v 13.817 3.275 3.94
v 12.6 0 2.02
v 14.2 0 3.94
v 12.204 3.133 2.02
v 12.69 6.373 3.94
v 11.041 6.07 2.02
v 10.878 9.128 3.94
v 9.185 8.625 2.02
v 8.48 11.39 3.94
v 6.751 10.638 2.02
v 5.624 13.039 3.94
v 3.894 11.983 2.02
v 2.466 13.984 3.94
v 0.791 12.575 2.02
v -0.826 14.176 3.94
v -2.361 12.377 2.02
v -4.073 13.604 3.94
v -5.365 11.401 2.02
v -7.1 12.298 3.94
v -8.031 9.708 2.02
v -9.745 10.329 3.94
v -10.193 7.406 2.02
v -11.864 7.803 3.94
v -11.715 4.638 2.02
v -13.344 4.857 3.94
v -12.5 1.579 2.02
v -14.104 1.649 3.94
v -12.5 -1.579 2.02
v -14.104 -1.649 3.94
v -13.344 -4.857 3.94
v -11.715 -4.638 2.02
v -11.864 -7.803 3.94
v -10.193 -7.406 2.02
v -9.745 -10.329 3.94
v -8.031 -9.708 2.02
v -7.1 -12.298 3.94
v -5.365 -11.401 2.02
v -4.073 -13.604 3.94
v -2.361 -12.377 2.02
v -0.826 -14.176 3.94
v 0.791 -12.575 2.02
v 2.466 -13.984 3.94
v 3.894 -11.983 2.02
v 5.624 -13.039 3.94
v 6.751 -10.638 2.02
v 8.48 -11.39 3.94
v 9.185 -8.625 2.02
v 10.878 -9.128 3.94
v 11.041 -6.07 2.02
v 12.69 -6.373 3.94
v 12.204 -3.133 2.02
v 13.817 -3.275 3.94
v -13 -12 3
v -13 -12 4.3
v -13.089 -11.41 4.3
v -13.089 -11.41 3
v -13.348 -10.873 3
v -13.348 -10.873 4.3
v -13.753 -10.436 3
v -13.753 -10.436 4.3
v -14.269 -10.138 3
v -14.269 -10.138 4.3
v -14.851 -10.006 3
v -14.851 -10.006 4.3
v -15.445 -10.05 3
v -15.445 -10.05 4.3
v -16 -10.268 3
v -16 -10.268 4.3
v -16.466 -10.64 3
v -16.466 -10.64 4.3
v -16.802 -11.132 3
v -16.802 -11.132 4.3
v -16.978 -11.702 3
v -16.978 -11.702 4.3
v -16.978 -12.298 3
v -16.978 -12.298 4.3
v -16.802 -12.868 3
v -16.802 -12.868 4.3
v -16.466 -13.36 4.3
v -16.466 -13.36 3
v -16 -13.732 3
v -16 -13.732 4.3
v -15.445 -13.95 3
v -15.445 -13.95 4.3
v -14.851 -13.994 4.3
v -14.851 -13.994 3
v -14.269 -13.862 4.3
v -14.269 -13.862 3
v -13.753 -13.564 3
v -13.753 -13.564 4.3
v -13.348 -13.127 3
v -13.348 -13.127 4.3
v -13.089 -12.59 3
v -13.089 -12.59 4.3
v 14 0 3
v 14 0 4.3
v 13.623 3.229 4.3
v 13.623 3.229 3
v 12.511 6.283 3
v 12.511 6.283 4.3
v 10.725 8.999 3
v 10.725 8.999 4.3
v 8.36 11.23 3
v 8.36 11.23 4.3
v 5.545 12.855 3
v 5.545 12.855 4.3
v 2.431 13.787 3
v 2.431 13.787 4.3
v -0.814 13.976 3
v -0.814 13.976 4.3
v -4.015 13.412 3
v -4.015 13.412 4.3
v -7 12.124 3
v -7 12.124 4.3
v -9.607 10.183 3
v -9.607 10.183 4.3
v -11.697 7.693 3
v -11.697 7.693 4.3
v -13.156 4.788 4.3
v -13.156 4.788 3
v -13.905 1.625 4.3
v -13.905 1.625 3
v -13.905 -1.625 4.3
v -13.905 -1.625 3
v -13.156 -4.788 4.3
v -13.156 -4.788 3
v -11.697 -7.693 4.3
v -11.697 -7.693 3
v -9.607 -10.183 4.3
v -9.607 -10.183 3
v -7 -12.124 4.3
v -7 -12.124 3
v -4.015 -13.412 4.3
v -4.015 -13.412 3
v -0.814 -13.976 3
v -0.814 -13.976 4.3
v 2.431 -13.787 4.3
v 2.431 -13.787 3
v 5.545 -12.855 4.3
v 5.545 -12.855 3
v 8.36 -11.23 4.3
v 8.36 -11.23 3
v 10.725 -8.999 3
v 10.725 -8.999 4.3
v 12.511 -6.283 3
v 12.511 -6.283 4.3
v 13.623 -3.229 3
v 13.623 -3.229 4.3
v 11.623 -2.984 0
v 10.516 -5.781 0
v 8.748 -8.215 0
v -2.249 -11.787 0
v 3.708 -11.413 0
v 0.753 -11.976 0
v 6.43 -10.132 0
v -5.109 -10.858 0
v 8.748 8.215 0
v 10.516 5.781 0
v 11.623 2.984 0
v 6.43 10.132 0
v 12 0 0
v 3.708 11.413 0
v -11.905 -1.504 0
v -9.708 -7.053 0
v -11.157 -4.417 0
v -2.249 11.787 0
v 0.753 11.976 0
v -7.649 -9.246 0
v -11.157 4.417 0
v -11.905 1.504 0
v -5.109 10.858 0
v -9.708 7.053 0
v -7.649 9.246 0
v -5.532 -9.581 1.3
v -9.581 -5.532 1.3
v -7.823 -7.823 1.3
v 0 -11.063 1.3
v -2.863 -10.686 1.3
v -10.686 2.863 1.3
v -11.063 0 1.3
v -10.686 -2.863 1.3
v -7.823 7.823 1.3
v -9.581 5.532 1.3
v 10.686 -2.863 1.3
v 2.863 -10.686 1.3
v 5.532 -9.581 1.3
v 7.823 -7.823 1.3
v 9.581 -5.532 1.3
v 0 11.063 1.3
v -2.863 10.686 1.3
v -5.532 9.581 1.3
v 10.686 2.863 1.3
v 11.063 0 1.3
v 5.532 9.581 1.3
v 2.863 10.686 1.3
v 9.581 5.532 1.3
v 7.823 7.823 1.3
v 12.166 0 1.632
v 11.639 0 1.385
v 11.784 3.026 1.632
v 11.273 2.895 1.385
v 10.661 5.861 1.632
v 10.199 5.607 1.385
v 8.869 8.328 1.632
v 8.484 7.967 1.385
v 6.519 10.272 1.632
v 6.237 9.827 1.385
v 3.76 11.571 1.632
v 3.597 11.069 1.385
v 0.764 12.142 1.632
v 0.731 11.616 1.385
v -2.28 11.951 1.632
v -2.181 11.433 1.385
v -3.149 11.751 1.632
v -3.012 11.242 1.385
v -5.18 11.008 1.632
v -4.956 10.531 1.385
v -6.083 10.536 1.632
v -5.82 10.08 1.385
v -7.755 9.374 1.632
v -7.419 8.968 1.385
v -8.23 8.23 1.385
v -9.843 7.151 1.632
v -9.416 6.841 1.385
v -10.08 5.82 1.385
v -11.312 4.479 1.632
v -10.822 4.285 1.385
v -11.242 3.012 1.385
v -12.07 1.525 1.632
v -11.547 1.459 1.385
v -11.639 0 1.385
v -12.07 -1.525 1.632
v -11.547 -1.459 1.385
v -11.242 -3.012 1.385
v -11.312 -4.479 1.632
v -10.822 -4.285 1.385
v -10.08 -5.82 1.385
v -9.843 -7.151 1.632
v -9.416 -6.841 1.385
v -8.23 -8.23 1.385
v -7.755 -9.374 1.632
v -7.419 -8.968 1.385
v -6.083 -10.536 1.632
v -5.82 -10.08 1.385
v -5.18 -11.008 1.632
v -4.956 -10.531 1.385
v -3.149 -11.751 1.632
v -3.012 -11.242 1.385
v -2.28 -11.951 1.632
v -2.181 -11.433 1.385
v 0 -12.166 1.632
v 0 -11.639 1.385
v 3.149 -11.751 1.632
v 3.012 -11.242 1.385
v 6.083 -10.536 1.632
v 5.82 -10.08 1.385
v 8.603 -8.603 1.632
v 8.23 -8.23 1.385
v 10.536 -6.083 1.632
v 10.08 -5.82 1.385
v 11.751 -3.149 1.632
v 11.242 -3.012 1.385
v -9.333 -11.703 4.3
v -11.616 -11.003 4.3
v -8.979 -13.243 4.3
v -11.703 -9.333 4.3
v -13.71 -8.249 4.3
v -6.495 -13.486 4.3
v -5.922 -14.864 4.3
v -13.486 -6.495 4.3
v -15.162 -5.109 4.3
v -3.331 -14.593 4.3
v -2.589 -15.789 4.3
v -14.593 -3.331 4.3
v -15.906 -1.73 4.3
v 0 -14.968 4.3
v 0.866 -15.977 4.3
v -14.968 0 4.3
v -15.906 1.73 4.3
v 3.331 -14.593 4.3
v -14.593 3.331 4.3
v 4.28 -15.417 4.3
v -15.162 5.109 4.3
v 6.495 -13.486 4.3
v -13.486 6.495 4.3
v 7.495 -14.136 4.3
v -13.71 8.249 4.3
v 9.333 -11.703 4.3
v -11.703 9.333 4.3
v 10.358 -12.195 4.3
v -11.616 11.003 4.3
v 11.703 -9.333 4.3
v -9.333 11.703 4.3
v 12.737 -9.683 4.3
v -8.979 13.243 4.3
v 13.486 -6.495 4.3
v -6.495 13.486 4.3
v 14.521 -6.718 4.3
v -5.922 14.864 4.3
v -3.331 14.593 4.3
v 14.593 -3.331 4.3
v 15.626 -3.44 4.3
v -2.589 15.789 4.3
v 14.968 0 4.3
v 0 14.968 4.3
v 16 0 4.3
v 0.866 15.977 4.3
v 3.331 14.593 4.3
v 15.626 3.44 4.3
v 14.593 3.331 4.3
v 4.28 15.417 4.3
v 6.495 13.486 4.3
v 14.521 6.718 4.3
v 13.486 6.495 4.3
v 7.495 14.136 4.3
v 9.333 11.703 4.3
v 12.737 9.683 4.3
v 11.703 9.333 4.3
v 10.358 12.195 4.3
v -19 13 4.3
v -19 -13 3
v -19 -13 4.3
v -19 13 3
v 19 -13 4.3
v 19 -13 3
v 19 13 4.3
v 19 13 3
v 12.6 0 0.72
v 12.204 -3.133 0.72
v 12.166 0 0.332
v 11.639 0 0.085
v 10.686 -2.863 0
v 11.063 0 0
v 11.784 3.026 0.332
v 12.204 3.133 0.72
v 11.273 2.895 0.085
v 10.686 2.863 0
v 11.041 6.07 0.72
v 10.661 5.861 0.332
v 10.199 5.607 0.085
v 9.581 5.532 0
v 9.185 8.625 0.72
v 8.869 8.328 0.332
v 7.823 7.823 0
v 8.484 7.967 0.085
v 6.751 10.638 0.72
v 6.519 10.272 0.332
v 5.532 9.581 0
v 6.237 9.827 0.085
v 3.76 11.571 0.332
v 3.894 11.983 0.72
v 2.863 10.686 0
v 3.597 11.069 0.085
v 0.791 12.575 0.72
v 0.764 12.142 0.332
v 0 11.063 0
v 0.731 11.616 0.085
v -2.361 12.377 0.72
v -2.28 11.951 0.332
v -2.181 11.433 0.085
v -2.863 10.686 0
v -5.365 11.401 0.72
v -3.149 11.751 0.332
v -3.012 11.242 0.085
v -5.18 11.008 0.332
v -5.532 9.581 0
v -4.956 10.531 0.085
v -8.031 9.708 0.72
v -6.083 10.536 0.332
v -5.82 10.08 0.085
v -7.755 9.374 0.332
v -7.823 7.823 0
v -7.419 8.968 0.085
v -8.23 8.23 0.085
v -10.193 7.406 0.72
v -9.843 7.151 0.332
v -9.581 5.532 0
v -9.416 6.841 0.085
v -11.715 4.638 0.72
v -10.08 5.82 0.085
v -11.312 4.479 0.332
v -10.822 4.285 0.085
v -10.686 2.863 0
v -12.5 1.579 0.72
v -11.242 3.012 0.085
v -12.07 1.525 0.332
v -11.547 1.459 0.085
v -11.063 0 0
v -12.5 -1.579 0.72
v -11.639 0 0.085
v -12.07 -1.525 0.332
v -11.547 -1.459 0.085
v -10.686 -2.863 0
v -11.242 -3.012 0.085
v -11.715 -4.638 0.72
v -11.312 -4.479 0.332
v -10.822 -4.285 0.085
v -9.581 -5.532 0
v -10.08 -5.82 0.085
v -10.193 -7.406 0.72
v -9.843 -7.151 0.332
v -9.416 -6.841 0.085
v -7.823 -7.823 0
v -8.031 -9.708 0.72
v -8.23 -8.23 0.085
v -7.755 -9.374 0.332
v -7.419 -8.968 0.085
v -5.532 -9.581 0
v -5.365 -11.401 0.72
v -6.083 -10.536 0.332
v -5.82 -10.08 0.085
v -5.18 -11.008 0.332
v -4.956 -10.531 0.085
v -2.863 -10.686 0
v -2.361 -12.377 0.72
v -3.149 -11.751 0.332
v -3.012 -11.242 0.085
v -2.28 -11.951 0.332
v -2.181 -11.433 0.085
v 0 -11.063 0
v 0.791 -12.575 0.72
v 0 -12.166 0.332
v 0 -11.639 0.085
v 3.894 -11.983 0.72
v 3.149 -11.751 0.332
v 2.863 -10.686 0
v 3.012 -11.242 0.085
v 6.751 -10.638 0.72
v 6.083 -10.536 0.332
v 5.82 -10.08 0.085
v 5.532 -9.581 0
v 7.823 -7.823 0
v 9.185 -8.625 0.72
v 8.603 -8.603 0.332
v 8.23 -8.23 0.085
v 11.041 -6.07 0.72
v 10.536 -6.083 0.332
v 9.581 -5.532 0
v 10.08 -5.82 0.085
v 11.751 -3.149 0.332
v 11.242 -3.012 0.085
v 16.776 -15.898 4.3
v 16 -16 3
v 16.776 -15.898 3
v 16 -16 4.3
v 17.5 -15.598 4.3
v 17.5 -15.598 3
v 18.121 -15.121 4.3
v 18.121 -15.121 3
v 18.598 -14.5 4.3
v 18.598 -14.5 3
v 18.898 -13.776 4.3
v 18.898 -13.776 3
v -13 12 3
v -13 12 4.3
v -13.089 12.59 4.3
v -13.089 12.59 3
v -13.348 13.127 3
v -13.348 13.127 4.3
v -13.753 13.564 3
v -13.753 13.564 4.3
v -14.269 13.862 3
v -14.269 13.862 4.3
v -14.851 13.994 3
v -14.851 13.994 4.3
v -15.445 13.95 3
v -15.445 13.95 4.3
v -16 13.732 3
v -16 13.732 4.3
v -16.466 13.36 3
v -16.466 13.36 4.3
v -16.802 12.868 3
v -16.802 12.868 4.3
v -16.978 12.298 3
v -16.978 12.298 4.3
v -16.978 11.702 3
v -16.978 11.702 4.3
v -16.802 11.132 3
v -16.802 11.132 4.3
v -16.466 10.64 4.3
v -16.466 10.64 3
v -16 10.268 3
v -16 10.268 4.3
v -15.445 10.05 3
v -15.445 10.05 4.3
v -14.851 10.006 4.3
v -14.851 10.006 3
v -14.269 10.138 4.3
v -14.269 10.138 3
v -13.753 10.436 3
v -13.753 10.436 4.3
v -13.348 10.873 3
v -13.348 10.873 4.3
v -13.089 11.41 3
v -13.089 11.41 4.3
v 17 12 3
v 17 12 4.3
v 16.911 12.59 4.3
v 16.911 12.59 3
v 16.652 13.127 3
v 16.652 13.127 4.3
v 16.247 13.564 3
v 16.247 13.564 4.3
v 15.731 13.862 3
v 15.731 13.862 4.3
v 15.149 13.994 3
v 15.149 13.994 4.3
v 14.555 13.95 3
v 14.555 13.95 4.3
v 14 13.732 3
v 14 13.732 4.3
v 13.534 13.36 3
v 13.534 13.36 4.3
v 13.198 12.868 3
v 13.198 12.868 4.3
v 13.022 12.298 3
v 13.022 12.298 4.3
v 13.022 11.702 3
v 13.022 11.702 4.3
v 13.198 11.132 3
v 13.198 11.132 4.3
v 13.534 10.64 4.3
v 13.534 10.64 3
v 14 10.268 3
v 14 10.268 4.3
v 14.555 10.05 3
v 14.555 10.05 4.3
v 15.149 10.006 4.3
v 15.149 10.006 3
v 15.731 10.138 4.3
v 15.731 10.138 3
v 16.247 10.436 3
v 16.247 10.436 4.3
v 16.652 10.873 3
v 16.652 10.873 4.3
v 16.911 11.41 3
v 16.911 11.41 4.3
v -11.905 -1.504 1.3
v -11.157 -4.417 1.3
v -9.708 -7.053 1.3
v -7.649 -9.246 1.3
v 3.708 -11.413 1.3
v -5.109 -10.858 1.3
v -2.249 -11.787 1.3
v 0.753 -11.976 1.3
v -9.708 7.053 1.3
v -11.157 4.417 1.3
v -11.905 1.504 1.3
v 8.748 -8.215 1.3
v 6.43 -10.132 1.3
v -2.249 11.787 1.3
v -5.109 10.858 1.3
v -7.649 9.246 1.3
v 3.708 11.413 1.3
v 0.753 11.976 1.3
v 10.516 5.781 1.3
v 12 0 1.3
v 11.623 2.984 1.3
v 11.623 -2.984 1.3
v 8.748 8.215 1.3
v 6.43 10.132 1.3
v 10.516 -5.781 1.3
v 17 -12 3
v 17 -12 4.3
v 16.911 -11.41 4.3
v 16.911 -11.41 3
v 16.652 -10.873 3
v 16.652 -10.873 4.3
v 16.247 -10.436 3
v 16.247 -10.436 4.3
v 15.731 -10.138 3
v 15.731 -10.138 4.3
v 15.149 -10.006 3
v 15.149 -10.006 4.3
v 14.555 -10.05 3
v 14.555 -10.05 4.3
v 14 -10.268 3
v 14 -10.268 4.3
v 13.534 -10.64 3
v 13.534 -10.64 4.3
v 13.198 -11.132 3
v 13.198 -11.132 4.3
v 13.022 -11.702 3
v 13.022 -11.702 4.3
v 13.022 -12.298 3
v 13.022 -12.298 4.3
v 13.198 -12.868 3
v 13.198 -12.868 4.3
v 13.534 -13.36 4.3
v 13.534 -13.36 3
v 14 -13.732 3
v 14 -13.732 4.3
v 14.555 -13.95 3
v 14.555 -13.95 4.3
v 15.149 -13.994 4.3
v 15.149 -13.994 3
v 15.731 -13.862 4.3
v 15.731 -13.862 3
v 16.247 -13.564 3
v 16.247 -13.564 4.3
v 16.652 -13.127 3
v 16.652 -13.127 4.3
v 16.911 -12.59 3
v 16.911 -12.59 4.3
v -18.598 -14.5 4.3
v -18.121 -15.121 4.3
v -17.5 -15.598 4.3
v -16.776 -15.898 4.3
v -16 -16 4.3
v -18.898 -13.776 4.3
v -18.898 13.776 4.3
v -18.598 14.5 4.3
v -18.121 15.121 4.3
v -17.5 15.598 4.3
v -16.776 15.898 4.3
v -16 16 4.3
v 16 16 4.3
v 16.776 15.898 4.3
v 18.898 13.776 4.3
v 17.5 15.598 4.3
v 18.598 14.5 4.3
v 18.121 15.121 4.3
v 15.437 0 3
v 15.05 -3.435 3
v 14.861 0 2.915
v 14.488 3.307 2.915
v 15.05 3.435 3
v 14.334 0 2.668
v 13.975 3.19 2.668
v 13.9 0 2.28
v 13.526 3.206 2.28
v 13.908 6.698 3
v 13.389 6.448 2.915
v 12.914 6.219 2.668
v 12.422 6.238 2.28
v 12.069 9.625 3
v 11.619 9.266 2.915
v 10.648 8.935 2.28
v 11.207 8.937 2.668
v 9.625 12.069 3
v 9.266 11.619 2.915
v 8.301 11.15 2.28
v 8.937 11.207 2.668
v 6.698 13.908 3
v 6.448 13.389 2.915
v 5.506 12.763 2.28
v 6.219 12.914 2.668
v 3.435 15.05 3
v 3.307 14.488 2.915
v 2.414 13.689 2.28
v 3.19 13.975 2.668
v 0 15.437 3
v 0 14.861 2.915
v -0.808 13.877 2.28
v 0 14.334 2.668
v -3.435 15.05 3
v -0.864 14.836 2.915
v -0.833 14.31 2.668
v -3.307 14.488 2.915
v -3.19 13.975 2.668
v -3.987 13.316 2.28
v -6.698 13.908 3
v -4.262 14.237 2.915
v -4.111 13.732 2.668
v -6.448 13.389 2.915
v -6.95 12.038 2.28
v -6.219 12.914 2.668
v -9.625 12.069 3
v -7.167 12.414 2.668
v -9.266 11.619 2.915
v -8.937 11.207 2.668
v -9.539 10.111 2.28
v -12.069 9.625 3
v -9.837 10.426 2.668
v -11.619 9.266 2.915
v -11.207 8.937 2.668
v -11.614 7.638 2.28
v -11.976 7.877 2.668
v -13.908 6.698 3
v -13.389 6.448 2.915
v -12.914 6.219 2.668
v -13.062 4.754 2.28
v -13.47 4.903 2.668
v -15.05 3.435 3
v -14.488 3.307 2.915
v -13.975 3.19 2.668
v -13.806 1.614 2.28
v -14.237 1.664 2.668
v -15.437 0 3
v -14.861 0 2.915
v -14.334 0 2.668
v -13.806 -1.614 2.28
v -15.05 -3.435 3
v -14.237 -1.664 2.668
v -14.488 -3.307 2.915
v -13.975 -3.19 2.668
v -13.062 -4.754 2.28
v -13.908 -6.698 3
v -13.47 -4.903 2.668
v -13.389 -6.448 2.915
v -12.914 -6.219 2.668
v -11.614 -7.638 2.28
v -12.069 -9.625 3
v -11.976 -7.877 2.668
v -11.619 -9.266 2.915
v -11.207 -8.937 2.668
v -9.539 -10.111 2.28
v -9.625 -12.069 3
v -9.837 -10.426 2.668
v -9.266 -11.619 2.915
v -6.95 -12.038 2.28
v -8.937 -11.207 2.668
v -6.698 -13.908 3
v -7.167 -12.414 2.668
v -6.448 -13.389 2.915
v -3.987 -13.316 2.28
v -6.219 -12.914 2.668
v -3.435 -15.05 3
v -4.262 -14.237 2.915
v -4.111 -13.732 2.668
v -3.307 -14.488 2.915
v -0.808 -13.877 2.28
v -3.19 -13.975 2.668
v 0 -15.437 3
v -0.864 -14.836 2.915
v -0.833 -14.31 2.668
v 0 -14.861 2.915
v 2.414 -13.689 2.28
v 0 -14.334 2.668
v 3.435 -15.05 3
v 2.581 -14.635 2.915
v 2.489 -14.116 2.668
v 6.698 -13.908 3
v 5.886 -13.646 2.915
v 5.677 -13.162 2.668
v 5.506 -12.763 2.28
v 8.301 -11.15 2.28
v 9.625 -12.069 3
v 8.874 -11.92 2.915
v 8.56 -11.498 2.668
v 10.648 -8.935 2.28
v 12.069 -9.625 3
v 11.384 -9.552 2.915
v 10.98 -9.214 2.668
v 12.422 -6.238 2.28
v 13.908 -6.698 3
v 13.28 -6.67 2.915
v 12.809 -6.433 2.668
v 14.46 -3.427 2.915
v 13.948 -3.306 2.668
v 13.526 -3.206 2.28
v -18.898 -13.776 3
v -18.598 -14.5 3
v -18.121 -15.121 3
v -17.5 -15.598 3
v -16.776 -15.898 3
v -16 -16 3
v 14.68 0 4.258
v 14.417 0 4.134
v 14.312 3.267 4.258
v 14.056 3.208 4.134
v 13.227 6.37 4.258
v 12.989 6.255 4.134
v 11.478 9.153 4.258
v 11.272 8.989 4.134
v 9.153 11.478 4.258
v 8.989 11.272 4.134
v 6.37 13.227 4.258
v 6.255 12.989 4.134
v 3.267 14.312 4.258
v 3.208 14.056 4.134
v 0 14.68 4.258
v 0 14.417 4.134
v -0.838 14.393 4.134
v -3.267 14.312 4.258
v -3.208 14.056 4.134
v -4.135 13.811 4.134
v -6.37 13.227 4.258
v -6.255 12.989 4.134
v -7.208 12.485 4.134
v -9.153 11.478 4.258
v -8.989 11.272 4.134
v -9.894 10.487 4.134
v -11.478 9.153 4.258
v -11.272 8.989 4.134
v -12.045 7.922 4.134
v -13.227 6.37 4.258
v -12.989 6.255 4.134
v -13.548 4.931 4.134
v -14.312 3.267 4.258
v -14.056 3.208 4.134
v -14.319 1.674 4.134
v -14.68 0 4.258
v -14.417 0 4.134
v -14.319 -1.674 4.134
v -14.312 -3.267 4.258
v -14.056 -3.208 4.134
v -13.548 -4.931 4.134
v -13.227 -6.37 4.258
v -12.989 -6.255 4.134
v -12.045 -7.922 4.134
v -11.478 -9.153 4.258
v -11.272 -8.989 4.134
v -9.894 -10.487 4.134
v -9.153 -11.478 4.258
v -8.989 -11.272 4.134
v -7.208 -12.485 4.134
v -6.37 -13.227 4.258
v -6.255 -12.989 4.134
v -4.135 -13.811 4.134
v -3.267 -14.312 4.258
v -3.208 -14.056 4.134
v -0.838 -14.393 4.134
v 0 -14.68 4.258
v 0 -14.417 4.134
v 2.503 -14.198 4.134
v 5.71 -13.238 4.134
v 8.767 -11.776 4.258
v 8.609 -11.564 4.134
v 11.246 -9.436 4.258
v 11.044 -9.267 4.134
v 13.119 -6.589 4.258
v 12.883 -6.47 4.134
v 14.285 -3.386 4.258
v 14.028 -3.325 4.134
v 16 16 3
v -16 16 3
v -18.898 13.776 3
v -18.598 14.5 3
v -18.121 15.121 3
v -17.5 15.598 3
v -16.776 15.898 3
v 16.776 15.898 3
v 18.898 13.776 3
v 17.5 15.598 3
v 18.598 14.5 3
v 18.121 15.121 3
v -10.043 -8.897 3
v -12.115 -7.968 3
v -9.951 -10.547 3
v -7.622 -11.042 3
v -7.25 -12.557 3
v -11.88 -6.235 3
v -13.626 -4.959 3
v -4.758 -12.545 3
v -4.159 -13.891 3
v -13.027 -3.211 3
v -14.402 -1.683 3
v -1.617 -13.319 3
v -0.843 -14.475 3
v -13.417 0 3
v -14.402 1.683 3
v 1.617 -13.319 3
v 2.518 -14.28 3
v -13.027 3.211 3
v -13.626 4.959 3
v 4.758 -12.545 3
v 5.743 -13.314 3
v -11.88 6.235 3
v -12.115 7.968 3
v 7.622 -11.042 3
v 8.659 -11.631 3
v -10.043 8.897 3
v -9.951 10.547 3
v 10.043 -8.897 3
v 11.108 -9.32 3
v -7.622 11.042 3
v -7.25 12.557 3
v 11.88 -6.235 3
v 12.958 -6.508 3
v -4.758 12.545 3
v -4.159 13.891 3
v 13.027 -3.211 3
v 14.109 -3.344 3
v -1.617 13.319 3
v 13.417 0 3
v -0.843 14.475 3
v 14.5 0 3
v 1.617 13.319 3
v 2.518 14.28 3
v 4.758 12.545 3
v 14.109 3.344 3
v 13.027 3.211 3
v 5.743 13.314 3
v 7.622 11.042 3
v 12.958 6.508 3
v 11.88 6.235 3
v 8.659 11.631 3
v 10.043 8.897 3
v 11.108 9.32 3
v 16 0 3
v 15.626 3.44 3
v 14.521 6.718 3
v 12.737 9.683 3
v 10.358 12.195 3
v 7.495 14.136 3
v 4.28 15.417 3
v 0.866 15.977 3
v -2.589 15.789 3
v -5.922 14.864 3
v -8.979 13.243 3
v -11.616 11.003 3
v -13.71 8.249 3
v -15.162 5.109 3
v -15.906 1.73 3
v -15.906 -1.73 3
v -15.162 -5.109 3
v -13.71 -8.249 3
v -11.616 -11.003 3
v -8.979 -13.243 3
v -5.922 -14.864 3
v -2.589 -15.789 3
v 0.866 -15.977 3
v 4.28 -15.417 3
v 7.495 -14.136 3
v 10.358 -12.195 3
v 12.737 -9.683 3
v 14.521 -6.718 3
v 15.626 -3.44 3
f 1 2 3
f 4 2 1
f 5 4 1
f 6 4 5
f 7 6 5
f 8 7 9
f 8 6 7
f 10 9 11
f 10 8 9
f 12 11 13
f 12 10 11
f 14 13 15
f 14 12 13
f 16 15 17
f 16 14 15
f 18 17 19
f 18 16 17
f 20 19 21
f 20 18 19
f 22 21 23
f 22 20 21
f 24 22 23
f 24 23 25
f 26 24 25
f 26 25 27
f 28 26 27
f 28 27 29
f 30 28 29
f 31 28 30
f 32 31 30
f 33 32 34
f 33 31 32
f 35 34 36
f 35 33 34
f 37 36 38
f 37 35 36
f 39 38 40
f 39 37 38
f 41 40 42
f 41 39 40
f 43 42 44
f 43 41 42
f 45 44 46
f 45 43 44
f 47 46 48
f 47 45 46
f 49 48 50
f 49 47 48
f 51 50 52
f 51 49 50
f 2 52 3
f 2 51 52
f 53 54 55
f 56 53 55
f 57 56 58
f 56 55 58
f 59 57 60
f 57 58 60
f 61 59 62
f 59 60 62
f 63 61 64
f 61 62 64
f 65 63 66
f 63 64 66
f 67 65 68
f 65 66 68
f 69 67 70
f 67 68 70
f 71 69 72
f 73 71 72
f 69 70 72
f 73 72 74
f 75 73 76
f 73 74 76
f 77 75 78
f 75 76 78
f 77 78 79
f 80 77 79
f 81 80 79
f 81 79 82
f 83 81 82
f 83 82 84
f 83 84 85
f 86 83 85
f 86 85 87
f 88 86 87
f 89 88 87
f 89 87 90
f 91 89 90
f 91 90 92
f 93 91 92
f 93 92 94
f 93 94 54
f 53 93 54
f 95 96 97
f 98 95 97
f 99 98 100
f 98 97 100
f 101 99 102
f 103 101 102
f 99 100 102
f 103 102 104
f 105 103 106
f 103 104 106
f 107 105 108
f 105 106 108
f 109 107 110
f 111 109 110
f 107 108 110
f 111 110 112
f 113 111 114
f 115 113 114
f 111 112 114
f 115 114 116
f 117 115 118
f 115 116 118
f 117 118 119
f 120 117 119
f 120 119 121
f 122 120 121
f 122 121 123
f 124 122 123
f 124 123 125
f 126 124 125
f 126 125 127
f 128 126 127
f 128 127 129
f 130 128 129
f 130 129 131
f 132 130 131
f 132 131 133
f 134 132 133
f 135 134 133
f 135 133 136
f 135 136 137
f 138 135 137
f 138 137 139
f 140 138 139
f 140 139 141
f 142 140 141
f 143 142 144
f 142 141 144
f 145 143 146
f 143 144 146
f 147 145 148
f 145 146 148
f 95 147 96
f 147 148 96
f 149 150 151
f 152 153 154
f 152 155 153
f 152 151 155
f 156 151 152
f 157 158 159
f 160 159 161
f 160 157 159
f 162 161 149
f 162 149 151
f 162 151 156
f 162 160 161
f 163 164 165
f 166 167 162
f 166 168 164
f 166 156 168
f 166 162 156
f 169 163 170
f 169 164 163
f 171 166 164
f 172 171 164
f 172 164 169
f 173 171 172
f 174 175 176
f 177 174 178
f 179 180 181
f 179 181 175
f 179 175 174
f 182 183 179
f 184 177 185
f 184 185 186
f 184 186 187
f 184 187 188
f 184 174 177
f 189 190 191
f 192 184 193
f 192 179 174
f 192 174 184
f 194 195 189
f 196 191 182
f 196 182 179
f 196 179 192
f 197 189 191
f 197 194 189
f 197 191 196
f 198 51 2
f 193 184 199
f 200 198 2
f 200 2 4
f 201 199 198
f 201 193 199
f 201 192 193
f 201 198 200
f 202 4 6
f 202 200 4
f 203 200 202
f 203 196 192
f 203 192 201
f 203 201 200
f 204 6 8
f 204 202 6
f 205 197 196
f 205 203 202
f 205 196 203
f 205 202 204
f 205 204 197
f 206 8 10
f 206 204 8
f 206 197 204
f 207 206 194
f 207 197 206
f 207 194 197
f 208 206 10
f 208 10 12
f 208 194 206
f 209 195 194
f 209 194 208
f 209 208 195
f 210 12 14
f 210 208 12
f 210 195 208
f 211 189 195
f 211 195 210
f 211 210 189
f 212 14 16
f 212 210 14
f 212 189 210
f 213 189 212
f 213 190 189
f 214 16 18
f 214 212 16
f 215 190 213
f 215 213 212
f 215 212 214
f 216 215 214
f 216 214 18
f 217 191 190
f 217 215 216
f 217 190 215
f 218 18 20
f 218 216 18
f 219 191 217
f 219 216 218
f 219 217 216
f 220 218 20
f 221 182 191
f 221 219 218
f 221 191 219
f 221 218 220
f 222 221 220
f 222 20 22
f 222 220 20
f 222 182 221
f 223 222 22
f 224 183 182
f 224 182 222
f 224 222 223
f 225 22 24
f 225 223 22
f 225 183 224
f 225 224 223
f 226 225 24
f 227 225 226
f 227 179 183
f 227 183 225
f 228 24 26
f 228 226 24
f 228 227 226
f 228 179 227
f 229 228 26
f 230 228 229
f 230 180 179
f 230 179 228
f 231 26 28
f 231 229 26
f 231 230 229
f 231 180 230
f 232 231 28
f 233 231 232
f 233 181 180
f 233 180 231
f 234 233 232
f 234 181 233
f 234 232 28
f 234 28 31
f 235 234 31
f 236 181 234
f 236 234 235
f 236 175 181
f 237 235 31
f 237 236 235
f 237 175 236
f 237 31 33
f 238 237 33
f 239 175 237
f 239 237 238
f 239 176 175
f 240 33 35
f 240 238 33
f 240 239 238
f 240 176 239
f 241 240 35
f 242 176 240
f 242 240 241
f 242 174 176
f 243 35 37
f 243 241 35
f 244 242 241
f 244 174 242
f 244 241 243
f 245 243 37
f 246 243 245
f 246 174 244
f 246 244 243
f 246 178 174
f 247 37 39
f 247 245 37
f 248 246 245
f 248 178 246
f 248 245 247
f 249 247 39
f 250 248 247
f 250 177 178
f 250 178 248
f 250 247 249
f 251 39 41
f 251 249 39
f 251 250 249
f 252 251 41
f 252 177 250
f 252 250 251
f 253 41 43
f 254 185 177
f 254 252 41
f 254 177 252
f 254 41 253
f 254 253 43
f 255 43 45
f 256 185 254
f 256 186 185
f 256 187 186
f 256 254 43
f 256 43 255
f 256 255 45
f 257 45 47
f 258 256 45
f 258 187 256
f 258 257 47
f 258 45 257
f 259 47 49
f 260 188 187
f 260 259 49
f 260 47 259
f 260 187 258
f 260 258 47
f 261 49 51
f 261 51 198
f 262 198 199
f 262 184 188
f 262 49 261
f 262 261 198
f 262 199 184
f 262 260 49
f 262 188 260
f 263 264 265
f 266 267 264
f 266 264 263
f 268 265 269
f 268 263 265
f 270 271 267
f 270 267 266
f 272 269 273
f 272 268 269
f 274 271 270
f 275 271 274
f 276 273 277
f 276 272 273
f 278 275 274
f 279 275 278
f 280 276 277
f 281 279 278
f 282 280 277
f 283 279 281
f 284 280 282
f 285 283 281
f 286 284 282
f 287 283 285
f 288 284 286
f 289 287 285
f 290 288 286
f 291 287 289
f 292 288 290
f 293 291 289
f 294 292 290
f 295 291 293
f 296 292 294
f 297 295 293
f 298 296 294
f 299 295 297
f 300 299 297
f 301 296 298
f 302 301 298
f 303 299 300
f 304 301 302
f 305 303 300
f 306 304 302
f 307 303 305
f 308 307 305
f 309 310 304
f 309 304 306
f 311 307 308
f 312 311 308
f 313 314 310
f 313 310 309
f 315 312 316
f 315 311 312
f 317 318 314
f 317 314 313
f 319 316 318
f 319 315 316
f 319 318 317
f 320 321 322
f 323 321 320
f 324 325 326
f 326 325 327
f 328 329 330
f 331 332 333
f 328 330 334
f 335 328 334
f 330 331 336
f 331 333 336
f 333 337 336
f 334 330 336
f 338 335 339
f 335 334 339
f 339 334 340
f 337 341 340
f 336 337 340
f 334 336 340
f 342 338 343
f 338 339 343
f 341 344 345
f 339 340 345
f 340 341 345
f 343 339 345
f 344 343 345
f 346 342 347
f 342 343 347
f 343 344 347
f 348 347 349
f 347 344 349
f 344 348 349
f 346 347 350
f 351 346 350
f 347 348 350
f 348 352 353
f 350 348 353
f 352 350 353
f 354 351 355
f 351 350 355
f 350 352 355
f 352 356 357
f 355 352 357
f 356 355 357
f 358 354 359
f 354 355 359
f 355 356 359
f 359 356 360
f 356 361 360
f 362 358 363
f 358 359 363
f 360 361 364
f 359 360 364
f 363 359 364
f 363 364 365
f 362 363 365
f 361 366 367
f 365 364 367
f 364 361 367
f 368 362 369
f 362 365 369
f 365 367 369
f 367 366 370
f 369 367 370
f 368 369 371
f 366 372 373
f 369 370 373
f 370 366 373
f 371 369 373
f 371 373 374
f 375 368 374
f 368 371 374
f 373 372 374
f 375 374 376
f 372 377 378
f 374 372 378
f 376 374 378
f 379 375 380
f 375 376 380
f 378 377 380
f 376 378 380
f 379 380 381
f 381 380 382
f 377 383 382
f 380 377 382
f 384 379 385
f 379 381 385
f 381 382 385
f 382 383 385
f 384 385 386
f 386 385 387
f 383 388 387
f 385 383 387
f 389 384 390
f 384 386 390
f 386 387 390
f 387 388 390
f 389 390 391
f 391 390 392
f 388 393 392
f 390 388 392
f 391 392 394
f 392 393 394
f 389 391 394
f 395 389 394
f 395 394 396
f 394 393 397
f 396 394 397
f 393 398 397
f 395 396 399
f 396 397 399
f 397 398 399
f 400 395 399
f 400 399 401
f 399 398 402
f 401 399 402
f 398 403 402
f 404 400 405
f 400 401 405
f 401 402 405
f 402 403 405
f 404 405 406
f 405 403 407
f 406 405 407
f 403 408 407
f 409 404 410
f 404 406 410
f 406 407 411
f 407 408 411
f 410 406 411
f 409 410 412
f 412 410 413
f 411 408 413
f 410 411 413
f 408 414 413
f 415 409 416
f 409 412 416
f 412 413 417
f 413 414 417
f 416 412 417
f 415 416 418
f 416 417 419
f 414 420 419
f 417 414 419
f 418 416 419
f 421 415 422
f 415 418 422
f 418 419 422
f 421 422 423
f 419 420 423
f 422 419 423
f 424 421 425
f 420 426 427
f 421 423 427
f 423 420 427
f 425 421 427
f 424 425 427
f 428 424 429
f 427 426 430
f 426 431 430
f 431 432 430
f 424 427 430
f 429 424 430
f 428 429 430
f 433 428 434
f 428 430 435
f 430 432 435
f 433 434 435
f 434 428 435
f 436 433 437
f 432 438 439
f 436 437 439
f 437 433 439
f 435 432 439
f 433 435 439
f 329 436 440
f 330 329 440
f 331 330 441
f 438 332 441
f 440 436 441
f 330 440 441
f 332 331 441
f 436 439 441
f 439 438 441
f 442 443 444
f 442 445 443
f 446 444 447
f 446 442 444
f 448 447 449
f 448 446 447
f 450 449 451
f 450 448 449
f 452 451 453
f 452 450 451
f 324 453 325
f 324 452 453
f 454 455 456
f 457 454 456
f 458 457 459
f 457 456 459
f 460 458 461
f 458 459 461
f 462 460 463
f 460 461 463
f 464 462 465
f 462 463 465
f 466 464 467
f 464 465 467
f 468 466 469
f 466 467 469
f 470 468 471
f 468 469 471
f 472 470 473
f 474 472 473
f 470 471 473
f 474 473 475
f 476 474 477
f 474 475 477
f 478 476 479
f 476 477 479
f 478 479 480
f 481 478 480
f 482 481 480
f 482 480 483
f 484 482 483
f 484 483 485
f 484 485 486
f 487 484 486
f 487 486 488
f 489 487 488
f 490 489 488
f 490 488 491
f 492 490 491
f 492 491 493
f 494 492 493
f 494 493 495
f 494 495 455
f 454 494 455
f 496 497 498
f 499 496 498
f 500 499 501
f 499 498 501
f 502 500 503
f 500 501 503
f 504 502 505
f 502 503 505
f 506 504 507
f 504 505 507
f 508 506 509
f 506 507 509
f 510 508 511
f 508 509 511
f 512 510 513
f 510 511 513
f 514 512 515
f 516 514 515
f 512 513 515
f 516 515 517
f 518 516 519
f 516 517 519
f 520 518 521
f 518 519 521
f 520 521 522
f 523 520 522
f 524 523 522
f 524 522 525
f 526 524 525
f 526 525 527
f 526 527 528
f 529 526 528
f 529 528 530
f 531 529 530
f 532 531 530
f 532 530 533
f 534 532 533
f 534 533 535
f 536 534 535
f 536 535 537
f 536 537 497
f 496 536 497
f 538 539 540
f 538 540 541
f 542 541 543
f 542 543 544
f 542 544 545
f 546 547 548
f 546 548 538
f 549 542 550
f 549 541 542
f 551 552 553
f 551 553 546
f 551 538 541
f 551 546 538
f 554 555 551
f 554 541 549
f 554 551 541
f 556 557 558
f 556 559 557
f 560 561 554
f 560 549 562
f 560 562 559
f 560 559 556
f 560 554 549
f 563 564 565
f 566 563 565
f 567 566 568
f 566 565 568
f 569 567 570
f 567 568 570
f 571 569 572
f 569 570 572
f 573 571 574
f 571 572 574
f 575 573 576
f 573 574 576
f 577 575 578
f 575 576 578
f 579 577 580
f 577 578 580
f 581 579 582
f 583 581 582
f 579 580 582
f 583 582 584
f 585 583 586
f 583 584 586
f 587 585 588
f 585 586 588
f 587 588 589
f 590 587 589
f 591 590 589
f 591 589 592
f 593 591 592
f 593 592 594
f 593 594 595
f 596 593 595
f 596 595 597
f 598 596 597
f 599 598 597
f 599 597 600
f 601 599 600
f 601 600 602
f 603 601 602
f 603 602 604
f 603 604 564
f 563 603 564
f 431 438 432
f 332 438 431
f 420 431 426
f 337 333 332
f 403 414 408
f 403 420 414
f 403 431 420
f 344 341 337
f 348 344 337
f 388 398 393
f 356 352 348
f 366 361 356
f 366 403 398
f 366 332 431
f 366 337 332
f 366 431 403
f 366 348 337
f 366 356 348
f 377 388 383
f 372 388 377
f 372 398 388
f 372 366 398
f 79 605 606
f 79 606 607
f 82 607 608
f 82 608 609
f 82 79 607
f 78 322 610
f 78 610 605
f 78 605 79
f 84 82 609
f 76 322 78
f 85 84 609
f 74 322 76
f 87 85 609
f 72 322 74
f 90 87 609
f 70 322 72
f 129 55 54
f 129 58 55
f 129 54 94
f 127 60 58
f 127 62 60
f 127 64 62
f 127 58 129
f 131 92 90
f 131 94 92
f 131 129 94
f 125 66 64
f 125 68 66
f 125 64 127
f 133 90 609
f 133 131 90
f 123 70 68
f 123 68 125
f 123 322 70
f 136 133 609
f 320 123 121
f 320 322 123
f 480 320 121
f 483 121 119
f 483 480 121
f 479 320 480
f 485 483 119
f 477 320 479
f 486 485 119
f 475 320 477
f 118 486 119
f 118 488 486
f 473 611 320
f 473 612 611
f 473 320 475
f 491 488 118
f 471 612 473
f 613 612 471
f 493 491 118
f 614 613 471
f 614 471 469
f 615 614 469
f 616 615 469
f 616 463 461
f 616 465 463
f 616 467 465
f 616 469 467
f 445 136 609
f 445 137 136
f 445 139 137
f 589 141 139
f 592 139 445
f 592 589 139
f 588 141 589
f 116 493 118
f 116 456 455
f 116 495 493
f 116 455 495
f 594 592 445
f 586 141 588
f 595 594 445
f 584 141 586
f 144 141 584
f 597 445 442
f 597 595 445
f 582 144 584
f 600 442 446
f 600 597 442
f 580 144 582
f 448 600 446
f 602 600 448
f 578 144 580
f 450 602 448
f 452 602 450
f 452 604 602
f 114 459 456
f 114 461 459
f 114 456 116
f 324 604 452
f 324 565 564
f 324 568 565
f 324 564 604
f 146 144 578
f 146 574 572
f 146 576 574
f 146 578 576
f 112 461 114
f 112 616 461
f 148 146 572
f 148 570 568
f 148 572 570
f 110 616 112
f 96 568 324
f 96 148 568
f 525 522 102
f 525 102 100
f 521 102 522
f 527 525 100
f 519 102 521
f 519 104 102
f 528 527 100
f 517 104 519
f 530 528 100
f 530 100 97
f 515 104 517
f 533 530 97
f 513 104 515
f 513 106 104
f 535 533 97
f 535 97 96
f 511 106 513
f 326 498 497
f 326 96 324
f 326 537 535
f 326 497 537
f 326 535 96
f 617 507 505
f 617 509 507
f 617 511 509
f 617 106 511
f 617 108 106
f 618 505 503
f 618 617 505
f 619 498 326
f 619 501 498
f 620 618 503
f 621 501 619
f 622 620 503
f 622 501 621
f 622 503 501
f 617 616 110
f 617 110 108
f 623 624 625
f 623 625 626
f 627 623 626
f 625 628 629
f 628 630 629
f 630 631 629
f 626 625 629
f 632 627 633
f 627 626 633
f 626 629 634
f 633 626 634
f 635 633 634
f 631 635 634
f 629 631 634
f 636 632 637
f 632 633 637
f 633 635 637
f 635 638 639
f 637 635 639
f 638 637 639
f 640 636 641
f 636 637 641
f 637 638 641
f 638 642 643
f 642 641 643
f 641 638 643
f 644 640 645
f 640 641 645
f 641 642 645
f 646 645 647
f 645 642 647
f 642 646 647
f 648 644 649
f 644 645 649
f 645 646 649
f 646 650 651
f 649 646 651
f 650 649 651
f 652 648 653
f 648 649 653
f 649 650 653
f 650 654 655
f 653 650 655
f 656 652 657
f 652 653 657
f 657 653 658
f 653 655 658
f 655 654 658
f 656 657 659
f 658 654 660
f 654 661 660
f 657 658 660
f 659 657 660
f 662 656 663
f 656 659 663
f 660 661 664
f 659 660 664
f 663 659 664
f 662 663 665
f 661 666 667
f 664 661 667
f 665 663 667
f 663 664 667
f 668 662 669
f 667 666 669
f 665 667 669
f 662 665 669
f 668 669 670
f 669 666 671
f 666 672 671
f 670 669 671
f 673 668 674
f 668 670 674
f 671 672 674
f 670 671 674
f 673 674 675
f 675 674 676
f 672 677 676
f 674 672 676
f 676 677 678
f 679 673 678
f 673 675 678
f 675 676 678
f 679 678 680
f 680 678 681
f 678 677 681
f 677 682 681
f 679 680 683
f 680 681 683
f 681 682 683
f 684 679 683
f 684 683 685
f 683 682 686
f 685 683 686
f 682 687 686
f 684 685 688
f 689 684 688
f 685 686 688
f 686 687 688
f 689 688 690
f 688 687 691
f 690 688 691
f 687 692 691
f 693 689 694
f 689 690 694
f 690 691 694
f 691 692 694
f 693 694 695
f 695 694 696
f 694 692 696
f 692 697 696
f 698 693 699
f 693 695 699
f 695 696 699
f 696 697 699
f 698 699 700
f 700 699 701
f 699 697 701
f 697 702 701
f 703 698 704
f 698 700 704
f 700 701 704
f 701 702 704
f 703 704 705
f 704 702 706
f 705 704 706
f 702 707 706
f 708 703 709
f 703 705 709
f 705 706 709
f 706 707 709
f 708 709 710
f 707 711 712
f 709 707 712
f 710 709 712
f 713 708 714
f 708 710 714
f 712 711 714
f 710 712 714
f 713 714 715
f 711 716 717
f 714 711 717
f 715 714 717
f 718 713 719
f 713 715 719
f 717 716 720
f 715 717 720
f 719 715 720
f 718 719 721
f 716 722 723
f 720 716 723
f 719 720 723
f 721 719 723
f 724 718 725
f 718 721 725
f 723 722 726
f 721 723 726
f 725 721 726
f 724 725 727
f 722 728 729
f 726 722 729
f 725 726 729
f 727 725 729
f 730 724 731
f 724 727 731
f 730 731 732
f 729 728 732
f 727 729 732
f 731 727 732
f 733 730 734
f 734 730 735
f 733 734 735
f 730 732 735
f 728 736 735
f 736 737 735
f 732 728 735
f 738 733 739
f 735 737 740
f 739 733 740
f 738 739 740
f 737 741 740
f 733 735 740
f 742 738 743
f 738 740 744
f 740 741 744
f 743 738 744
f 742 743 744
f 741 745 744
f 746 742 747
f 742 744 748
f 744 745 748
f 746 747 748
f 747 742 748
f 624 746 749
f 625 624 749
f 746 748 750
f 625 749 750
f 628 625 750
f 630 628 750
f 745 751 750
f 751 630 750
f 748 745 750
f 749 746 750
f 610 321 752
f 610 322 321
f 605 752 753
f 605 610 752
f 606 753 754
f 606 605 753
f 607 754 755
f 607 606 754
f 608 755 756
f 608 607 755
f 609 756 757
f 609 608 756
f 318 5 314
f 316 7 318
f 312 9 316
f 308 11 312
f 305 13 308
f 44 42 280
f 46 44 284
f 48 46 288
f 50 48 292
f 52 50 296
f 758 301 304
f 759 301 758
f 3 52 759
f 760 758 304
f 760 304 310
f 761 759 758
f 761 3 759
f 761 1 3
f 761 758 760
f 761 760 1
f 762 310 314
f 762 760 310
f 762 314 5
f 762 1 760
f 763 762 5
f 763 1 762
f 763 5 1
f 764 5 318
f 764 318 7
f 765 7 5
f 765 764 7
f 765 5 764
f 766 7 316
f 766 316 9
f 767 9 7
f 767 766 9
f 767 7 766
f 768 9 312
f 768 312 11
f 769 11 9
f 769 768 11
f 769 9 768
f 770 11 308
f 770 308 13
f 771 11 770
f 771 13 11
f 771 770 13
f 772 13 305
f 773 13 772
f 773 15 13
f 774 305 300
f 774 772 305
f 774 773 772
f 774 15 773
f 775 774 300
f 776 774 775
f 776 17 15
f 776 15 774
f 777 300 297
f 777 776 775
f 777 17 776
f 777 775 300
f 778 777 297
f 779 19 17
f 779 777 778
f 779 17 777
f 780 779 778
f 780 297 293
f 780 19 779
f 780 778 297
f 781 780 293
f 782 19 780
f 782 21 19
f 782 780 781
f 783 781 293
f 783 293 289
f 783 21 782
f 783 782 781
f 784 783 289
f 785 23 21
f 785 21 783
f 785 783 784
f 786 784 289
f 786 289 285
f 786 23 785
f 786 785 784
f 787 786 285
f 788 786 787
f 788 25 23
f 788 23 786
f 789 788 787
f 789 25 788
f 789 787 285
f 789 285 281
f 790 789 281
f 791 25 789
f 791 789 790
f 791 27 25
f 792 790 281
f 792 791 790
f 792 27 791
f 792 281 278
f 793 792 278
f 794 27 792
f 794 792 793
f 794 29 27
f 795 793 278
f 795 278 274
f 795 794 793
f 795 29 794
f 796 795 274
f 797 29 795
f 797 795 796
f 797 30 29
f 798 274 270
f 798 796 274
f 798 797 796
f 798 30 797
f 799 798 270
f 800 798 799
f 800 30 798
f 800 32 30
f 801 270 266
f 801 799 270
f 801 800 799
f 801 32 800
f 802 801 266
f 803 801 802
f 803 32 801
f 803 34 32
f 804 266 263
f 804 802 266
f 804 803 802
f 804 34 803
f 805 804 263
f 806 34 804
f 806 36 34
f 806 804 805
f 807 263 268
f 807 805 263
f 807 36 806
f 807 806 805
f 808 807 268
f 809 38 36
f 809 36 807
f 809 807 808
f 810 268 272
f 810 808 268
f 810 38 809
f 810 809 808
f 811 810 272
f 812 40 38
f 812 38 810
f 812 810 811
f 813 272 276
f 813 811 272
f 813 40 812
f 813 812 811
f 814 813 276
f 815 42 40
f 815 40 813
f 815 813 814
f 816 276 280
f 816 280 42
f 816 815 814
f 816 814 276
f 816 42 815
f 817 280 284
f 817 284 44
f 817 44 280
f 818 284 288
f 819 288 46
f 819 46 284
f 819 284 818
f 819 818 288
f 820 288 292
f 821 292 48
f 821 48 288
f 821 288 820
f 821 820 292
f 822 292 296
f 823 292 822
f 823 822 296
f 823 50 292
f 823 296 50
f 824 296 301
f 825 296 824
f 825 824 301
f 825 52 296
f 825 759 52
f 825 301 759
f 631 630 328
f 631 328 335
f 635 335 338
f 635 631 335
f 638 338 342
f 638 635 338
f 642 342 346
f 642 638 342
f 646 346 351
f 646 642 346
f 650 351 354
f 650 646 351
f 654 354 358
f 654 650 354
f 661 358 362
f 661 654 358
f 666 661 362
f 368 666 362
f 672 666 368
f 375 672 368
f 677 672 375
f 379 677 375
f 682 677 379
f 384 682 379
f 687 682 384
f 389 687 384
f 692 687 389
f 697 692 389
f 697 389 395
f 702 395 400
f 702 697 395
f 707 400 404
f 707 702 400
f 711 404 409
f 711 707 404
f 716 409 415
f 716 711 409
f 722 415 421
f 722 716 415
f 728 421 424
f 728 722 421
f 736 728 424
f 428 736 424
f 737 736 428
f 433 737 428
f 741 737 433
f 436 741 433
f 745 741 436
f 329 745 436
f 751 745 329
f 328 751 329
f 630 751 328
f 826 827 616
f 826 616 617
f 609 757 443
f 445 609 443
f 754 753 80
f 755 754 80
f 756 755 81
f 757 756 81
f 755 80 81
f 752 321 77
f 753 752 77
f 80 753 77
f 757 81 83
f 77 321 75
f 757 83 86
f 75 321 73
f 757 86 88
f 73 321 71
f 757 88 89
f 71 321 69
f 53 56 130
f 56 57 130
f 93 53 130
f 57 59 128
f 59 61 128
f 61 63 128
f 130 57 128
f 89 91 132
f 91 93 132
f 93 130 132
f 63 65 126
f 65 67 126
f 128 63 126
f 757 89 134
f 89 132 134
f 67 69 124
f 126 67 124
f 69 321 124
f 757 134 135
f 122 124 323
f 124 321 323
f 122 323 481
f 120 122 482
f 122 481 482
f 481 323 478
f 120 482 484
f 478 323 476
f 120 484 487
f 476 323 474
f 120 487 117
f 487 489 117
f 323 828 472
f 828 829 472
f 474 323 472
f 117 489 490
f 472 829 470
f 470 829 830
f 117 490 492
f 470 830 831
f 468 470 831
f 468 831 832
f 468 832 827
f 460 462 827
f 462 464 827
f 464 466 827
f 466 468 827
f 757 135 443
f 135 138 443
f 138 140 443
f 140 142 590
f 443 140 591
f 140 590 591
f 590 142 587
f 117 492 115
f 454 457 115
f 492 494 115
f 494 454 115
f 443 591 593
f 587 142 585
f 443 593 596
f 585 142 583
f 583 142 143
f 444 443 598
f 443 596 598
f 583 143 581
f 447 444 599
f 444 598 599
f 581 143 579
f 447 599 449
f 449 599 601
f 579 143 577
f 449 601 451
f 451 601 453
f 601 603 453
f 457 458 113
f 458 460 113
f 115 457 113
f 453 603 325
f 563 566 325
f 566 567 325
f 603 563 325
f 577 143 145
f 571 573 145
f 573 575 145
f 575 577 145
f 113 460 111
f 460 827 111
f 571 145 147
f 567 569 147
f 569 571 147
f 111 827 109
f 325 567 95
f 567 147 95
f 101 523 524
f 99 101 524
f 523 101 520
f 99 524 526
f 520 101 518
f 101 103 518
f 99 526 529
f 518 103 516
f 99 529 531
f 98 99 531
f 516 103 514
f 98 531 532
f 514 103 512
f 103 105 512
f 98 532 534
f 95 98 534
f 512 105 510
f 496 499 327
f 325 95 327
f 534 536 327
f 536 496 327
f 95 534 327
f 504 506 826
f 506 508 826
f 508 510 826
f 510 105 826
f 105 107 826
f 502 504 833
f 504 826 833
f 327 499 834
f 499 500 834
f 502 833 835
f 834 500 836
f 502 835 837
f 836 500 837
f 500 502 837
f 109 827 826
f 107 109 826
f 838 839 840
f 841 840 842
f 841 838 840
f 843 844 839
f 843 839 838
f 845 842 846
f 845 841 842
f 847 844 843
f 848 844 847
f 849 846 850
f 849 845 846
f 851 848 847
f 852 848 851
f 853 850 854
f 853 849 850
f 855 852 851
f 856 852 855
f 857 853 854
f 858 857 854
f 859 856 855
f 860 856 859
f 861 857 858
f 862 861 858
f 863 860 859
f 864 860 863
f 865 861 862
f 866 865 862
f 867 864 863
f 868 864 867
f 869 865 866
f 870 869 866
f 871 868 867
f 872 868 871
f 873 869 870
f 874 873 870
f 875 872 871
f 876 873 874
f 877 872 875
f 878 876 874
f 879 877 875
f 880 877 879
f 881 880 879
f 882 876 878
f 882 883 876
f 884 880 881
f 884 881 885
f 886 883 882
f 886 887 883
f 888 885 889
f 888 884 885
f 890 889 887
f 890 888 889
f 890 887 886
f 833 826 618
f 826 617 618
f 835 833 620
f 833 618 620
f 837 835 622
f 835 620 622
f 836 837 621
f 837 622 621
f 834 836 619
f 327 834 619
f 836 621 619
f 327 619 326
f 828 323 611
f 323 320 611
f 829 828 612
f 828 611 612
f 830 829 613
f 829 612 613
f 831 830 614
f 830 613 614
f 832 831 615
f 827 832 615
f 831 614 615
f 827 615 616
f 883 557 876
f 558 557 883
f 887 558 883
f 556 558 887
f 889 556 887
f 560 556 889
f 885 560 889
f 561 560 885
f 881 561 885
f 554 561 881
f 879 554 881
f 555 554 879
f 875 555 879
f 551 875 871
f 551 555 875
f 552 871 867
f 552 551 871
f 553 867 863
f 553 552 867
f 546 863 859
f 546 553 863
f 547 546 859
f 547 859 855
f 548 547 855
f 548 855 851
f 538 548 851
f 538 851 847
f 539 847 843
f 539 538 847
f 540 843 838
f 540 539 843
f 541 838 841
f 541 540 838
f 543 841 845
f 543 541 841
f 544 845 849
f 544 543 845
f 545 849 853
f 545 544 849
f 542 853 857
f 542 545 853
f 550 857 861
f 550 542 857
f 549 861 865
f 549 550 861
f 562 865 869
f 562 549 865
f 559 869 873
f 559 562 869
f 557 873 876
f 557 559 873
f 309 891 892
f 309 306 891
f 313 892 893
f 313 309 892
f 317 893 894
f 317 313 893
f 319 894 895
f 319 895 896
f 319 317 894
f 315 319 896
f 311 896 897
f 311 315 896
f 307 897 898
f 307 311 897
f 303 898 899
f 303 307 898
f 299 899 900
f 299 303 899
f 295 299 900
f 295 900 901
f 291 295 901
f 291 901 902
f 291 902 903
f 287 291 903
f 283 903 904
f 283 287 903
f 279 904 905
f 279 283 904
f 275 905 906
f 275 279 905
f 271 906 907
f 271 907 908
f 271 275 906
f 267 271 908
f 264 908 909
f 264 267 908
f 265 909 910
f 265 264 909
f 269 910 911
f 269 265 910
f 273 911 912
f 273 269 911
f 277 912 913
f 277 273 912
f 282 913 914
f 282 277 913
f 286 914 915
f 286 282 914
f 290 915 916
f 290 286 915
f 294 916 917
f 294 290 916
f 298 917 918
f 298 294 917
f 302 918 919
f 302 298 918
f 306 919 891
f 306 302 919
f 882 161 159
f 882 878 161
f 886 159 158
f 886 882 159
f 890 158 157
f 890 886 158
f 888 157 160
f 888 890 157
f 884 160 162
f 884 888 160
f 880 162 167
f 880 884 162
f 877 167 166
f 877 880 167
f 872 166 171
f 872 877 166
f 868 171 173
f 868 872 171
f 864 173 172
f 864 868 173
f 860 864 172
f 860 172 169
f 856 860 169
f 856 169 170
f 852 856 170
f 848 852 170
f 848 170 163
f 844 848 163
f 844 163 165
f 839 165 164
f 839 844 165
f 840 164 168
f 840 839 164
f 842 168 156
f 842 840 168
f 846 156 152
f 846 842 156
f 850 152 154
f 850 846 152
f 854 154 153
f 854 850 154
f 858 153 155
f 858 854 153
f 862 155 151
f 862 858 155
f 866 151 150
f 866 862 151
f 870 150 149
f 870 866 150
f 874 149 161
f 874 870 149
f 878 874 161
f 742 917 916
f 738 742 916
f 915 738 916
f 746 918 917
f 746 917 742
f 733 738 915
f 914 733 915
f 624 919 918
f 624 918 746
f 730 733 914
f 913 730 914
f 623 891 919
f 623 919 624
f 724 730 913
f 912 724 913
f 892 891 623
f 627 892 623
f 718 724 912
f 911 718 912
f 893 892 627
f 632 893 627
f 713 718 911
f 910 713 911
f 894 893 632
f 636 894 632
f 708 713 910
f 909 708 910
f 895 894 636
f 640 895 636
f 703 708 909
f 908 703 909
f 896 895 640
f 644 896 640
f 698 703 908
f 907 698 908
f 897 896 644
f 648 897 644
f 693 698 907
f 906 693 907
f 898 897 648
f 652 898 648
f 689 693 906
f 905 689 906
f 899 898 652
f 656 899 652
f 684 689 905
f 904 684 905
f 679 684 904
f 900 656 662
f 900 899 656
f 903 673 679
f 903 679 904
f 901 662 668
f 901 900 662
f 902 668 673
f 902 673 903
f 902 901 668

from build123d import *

# Parameters (mm, degrees)
FILLET_R        = 1
FILLET001_R     = 2
FILLET002_R     = 2
BOX_W           = 38
BOX_H           = 32
BOX_DEPTH       = 1.3
SKETCH001_R     = 14
POCKET_DEPTH    = 1.301
FILLET003_R     = 3
SKETCH002_R     = 2
POCKET001_DEPTH = 1.301


with BuildPart() as revolution:
    # Sketch → Revolution (revolve)
    with BuildSketch(Plane.XZ):
        Polygon((0, 0), (12, 0), (14.5, 3), (16, 3), (16, 4.3), (14.5, 4.3), (12, 1.3), (0, 1.3), align=None)
    revolve(axis=Axis((0, 0, 0), (0, 0, 1)))


with BuildPart() as fillet002:
    # Fillet base: copy of Revolution
    add(revolution.part)

    # Fillet
    fillet_edges = [fillet002.edges().sort_by_distance(p)[0] for p in [
        (-14.5, 0, 4.3),
    ]]
    fillet(fillet_edges, radius=FILLET_R)

    # Fillet001
    fillet001_edges = [fillet002.edges().sort_by_distance(p)[0] for p in [
        (-12, 0, 1.3),
    ]]
    fillet(fillet001_edges, radius=FILLET001_R)

    # Fillet002
    fillet002_edges = [fillet002.edges().sort_by_distance(p)[0] for p in [
        (-12, 0, 0),
        (-14.5, 0, 3),
    ]]
    fillet(fillet002_edges, radius=FILLET002_R)


with BuildPart() as cube:
    # Box → Box (new body)
    with BuildSketch(Plane(origin=(-19, -16, 3), x_dir=(1, 0, 0), z_dir=(0, 0, 1))):
        with Locations((19, 16)):
            Rectangle(BOX_W, BOX_H)
    extrude(amount=BOX_DEPTH)


with BuildPart() as cut:
    # Cut base: copy of Revolution
    add(revolution.part)

    # Cut: cut Cube
    add(cube.part, mode=Mode.SUBTRACT)


with BuildPart() as pocket001:
    # Pocket base: copy of Cube
    add(cube.part)

    # Sketch001 → Pocket (cut, through all)
    with BuildSketch(Plane(origin=(-19, -16, 4.3), x_dir=(1, 0, 0), z_dir=(0, 0, 1))):
        with Locations((19, 16)):
            Circle(SKETCH001_R)
    extrude(amount=-POCKET_DEPTH, mode=Mode.SUBTRACT)

    # Fillet003
    fillet003_edges = [pocket001.edges().sort_by_distance(p)[0] for p in [
        (-19, -16, 3.65),
        (19, -16, 3.65),
        (19, 16, 3.65),
        (-19, 16, 3.65),
    ]]
    fillet(fillet003_edges, radius=FILLET003_R)

    # Sketch002 → Pocket001 (cut, through all)
    with BuildSketch(Plane(origin=(-19, -16, 4.3), x_dir=(1, 0, 0), z_dir=(0, 0, 1))):
        with Locations((4, 4)):
            Circle(SKETCH002_R)
        with Locations((34, 4)):
            Circle(SKETCH002_R)
        with Locations((34, 28)):
            Circle(SKETCH002_R)
        with Locations((4, 28)):
            Circle(SKETCH002_R)
    extrude(amount=-POCKET001_DEPTH, mode=Mode.SUBTRACT)


solid = Compound([fillet002.part, cut.part, pocket001.part])
